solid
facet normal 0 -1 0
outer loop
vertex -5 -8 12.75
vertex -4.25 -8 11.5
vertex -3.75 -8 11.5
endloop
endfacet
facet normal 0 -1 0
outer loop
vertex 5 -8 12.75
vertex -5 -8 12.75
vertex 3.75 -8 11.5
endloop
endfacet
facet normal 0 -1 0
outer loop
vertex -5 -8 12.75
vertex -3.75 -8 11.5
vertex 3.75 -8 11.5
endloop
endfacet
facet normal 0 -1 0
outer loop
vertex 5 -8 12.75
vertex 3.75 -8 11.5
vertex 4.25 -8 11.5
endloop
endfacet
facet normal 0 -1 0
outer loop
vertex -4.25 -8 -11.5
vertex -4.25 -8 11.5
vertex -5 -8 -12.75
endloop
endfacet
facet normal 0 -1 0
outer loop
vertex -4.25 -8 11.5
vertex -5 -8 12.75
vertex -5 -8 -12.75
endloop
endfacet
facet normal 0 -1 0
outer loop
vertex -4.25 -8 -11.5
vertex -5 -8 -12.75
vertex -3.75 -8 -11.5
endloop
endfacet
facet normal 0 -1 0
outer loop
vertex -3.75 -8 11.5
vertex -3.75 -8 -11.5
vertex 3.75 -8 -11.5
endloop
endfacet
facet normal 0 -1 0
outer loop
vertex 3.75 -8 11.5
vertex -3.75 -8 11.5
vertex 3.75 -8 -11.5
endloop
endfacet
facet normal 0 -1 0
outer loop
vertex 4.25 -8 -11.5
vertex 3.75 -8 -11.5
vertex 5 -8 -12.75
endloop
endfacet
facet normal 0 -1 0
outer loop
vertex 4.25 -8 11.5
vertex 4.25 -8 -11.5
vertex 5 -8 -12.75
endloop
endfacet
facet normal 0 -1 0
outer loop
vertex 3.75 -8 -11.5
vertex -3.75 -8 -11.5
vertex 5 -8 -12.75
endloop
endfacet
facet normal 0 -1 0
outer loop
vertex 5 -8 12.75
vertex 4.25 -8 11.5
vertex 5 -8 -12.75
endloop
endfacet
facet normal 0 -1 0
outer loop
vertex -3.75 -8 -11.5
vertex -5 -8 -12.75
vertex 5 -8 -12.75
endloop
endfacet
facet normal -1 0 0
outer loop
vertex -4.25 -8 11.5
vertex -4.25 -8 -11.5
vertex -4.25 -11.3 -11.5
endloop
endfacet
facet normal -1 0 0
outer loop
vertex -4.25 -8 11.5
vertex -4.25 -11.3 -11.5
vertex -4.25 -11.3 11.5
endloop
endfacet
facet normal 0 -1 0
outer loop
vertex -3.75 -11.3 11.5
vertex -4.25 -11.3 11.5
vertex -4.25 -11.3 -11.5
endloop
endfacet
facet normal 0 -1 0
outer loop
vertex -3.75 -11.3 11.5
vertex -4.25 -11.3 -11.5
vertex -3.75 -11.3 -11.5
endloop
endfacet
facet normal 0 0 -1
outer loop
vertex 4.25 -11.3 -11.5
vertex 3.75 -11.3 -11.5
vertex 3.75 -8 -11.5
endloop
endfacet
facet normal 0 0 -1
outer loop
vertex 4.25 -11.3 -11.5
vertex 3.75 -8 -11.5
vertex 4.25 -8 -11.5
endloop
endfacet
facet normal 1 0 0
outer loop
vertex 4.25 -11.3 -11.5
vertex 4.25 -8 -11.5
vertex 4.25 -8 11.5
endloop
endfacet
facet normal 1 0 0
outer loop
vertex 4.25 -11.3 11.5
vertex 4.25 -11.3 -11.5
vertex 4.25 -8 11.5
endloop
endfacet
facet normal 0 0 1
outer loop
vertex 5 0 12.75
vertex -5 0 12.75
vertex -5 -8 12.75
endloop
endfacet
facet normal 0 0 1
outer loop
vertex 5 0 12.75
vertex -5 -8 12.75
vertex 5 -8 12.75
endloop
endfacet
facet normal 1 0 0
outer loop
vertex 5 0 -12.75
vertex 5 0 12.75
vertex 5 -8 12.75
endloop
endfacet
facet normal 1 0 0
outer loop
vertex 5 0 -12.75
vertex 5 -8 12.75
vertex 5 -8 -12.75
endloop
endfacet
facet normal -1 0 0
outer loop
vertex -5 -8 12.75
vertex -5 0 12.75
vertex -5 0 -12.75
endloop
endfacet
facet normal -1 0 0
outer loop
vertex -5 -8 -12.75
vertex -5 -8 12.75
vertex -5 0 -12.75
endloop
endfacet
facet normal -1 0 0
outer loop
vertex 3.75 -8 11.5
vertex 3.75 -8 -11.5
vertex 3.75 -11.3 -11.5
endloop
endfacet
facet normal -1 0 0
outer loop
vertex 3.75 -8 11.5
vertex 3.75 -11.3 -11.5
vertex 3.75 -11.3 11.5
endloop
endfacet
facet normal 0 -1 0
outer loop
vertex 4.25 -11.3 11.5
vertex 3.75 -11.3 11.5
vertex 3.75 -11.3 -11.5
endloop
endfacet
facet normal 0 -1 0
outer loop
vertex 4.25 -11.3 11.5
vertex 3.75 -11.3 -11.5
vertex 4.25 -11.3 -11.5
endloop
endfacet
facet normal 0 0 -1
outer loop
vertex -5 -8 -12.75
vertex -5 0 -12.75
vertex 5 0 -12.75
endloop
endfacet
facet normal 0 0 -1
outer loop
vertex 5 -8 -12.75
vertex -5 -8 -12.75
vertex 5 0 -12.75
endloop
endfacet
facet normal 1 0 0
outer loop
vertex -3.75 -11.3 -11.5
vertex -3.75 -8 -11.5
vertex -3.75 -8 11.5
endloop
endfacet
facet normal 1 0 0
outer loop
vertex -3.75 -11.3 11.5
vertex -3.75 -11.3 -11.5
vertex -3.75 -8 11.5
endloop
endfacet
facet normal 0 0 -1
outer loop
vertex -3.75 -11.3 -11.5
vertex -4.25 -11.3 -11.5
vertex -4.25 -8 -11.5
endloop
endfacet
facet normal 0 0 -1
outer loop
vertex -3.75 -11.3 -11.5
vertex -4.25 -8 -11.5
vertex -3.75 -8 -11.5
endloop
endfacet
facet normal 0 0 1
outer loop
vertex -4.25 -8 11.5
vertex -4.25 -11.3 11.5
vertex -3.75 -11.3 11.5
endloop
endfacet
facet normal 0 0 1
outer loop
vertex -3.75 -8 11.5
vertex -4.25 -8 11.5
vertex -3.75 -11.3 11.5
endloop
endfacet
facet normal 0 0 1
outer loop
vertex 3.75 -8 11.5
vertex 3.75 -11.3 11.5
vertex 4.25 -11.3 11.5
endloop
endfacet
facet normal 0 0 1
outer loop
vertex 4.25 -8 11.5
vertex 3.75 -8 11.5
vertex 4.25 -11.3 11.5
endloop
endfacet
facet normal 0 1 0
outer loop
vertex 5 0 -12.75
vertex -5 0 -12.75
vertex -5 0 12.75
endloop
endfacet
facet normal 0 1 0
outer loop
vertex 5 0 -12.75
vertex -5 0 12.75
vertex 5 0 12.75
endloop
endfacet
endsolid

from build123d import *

# Parameters (mm, degrees)
SKETCH1_W           = 10
SKETCH1_H           = 25.5
BOSS_EXTRUDE1_DEPTH = 8
SKETCH2_W           = 0.5
SKETCH2_H           = 23
BOSS_EXTRUDE2_DEPTH = 3.3


with BuildPart() as part:
    # Sketch1 → Boss-Extrude1 (new body)
    with BuildSketch(Plane(origin=(0, 0, 0), x_dir=(1, 0, 0), z_dir=(0, 1, 0))):
        Rectangle(SKETCH1_W, SKETCH1_H)
    extrude(amount=-BOSS_EXTRUDE1_DEPTH)

    # Sketch2 → Boss-Extrude2 (add)
    with BuildSketch(Plane.XZ.offset(8)):
        with Locations((4, 0)):
            Rectangle(SKETCH2_W, SKETCH2_H)
        with Locations((-4, 0)):
            Rectangle(SKETCH2_W, SKETCH2_H)
    extrude(amount=BOSS_EXTRUDE2_DEPTH)


solid = part.part
